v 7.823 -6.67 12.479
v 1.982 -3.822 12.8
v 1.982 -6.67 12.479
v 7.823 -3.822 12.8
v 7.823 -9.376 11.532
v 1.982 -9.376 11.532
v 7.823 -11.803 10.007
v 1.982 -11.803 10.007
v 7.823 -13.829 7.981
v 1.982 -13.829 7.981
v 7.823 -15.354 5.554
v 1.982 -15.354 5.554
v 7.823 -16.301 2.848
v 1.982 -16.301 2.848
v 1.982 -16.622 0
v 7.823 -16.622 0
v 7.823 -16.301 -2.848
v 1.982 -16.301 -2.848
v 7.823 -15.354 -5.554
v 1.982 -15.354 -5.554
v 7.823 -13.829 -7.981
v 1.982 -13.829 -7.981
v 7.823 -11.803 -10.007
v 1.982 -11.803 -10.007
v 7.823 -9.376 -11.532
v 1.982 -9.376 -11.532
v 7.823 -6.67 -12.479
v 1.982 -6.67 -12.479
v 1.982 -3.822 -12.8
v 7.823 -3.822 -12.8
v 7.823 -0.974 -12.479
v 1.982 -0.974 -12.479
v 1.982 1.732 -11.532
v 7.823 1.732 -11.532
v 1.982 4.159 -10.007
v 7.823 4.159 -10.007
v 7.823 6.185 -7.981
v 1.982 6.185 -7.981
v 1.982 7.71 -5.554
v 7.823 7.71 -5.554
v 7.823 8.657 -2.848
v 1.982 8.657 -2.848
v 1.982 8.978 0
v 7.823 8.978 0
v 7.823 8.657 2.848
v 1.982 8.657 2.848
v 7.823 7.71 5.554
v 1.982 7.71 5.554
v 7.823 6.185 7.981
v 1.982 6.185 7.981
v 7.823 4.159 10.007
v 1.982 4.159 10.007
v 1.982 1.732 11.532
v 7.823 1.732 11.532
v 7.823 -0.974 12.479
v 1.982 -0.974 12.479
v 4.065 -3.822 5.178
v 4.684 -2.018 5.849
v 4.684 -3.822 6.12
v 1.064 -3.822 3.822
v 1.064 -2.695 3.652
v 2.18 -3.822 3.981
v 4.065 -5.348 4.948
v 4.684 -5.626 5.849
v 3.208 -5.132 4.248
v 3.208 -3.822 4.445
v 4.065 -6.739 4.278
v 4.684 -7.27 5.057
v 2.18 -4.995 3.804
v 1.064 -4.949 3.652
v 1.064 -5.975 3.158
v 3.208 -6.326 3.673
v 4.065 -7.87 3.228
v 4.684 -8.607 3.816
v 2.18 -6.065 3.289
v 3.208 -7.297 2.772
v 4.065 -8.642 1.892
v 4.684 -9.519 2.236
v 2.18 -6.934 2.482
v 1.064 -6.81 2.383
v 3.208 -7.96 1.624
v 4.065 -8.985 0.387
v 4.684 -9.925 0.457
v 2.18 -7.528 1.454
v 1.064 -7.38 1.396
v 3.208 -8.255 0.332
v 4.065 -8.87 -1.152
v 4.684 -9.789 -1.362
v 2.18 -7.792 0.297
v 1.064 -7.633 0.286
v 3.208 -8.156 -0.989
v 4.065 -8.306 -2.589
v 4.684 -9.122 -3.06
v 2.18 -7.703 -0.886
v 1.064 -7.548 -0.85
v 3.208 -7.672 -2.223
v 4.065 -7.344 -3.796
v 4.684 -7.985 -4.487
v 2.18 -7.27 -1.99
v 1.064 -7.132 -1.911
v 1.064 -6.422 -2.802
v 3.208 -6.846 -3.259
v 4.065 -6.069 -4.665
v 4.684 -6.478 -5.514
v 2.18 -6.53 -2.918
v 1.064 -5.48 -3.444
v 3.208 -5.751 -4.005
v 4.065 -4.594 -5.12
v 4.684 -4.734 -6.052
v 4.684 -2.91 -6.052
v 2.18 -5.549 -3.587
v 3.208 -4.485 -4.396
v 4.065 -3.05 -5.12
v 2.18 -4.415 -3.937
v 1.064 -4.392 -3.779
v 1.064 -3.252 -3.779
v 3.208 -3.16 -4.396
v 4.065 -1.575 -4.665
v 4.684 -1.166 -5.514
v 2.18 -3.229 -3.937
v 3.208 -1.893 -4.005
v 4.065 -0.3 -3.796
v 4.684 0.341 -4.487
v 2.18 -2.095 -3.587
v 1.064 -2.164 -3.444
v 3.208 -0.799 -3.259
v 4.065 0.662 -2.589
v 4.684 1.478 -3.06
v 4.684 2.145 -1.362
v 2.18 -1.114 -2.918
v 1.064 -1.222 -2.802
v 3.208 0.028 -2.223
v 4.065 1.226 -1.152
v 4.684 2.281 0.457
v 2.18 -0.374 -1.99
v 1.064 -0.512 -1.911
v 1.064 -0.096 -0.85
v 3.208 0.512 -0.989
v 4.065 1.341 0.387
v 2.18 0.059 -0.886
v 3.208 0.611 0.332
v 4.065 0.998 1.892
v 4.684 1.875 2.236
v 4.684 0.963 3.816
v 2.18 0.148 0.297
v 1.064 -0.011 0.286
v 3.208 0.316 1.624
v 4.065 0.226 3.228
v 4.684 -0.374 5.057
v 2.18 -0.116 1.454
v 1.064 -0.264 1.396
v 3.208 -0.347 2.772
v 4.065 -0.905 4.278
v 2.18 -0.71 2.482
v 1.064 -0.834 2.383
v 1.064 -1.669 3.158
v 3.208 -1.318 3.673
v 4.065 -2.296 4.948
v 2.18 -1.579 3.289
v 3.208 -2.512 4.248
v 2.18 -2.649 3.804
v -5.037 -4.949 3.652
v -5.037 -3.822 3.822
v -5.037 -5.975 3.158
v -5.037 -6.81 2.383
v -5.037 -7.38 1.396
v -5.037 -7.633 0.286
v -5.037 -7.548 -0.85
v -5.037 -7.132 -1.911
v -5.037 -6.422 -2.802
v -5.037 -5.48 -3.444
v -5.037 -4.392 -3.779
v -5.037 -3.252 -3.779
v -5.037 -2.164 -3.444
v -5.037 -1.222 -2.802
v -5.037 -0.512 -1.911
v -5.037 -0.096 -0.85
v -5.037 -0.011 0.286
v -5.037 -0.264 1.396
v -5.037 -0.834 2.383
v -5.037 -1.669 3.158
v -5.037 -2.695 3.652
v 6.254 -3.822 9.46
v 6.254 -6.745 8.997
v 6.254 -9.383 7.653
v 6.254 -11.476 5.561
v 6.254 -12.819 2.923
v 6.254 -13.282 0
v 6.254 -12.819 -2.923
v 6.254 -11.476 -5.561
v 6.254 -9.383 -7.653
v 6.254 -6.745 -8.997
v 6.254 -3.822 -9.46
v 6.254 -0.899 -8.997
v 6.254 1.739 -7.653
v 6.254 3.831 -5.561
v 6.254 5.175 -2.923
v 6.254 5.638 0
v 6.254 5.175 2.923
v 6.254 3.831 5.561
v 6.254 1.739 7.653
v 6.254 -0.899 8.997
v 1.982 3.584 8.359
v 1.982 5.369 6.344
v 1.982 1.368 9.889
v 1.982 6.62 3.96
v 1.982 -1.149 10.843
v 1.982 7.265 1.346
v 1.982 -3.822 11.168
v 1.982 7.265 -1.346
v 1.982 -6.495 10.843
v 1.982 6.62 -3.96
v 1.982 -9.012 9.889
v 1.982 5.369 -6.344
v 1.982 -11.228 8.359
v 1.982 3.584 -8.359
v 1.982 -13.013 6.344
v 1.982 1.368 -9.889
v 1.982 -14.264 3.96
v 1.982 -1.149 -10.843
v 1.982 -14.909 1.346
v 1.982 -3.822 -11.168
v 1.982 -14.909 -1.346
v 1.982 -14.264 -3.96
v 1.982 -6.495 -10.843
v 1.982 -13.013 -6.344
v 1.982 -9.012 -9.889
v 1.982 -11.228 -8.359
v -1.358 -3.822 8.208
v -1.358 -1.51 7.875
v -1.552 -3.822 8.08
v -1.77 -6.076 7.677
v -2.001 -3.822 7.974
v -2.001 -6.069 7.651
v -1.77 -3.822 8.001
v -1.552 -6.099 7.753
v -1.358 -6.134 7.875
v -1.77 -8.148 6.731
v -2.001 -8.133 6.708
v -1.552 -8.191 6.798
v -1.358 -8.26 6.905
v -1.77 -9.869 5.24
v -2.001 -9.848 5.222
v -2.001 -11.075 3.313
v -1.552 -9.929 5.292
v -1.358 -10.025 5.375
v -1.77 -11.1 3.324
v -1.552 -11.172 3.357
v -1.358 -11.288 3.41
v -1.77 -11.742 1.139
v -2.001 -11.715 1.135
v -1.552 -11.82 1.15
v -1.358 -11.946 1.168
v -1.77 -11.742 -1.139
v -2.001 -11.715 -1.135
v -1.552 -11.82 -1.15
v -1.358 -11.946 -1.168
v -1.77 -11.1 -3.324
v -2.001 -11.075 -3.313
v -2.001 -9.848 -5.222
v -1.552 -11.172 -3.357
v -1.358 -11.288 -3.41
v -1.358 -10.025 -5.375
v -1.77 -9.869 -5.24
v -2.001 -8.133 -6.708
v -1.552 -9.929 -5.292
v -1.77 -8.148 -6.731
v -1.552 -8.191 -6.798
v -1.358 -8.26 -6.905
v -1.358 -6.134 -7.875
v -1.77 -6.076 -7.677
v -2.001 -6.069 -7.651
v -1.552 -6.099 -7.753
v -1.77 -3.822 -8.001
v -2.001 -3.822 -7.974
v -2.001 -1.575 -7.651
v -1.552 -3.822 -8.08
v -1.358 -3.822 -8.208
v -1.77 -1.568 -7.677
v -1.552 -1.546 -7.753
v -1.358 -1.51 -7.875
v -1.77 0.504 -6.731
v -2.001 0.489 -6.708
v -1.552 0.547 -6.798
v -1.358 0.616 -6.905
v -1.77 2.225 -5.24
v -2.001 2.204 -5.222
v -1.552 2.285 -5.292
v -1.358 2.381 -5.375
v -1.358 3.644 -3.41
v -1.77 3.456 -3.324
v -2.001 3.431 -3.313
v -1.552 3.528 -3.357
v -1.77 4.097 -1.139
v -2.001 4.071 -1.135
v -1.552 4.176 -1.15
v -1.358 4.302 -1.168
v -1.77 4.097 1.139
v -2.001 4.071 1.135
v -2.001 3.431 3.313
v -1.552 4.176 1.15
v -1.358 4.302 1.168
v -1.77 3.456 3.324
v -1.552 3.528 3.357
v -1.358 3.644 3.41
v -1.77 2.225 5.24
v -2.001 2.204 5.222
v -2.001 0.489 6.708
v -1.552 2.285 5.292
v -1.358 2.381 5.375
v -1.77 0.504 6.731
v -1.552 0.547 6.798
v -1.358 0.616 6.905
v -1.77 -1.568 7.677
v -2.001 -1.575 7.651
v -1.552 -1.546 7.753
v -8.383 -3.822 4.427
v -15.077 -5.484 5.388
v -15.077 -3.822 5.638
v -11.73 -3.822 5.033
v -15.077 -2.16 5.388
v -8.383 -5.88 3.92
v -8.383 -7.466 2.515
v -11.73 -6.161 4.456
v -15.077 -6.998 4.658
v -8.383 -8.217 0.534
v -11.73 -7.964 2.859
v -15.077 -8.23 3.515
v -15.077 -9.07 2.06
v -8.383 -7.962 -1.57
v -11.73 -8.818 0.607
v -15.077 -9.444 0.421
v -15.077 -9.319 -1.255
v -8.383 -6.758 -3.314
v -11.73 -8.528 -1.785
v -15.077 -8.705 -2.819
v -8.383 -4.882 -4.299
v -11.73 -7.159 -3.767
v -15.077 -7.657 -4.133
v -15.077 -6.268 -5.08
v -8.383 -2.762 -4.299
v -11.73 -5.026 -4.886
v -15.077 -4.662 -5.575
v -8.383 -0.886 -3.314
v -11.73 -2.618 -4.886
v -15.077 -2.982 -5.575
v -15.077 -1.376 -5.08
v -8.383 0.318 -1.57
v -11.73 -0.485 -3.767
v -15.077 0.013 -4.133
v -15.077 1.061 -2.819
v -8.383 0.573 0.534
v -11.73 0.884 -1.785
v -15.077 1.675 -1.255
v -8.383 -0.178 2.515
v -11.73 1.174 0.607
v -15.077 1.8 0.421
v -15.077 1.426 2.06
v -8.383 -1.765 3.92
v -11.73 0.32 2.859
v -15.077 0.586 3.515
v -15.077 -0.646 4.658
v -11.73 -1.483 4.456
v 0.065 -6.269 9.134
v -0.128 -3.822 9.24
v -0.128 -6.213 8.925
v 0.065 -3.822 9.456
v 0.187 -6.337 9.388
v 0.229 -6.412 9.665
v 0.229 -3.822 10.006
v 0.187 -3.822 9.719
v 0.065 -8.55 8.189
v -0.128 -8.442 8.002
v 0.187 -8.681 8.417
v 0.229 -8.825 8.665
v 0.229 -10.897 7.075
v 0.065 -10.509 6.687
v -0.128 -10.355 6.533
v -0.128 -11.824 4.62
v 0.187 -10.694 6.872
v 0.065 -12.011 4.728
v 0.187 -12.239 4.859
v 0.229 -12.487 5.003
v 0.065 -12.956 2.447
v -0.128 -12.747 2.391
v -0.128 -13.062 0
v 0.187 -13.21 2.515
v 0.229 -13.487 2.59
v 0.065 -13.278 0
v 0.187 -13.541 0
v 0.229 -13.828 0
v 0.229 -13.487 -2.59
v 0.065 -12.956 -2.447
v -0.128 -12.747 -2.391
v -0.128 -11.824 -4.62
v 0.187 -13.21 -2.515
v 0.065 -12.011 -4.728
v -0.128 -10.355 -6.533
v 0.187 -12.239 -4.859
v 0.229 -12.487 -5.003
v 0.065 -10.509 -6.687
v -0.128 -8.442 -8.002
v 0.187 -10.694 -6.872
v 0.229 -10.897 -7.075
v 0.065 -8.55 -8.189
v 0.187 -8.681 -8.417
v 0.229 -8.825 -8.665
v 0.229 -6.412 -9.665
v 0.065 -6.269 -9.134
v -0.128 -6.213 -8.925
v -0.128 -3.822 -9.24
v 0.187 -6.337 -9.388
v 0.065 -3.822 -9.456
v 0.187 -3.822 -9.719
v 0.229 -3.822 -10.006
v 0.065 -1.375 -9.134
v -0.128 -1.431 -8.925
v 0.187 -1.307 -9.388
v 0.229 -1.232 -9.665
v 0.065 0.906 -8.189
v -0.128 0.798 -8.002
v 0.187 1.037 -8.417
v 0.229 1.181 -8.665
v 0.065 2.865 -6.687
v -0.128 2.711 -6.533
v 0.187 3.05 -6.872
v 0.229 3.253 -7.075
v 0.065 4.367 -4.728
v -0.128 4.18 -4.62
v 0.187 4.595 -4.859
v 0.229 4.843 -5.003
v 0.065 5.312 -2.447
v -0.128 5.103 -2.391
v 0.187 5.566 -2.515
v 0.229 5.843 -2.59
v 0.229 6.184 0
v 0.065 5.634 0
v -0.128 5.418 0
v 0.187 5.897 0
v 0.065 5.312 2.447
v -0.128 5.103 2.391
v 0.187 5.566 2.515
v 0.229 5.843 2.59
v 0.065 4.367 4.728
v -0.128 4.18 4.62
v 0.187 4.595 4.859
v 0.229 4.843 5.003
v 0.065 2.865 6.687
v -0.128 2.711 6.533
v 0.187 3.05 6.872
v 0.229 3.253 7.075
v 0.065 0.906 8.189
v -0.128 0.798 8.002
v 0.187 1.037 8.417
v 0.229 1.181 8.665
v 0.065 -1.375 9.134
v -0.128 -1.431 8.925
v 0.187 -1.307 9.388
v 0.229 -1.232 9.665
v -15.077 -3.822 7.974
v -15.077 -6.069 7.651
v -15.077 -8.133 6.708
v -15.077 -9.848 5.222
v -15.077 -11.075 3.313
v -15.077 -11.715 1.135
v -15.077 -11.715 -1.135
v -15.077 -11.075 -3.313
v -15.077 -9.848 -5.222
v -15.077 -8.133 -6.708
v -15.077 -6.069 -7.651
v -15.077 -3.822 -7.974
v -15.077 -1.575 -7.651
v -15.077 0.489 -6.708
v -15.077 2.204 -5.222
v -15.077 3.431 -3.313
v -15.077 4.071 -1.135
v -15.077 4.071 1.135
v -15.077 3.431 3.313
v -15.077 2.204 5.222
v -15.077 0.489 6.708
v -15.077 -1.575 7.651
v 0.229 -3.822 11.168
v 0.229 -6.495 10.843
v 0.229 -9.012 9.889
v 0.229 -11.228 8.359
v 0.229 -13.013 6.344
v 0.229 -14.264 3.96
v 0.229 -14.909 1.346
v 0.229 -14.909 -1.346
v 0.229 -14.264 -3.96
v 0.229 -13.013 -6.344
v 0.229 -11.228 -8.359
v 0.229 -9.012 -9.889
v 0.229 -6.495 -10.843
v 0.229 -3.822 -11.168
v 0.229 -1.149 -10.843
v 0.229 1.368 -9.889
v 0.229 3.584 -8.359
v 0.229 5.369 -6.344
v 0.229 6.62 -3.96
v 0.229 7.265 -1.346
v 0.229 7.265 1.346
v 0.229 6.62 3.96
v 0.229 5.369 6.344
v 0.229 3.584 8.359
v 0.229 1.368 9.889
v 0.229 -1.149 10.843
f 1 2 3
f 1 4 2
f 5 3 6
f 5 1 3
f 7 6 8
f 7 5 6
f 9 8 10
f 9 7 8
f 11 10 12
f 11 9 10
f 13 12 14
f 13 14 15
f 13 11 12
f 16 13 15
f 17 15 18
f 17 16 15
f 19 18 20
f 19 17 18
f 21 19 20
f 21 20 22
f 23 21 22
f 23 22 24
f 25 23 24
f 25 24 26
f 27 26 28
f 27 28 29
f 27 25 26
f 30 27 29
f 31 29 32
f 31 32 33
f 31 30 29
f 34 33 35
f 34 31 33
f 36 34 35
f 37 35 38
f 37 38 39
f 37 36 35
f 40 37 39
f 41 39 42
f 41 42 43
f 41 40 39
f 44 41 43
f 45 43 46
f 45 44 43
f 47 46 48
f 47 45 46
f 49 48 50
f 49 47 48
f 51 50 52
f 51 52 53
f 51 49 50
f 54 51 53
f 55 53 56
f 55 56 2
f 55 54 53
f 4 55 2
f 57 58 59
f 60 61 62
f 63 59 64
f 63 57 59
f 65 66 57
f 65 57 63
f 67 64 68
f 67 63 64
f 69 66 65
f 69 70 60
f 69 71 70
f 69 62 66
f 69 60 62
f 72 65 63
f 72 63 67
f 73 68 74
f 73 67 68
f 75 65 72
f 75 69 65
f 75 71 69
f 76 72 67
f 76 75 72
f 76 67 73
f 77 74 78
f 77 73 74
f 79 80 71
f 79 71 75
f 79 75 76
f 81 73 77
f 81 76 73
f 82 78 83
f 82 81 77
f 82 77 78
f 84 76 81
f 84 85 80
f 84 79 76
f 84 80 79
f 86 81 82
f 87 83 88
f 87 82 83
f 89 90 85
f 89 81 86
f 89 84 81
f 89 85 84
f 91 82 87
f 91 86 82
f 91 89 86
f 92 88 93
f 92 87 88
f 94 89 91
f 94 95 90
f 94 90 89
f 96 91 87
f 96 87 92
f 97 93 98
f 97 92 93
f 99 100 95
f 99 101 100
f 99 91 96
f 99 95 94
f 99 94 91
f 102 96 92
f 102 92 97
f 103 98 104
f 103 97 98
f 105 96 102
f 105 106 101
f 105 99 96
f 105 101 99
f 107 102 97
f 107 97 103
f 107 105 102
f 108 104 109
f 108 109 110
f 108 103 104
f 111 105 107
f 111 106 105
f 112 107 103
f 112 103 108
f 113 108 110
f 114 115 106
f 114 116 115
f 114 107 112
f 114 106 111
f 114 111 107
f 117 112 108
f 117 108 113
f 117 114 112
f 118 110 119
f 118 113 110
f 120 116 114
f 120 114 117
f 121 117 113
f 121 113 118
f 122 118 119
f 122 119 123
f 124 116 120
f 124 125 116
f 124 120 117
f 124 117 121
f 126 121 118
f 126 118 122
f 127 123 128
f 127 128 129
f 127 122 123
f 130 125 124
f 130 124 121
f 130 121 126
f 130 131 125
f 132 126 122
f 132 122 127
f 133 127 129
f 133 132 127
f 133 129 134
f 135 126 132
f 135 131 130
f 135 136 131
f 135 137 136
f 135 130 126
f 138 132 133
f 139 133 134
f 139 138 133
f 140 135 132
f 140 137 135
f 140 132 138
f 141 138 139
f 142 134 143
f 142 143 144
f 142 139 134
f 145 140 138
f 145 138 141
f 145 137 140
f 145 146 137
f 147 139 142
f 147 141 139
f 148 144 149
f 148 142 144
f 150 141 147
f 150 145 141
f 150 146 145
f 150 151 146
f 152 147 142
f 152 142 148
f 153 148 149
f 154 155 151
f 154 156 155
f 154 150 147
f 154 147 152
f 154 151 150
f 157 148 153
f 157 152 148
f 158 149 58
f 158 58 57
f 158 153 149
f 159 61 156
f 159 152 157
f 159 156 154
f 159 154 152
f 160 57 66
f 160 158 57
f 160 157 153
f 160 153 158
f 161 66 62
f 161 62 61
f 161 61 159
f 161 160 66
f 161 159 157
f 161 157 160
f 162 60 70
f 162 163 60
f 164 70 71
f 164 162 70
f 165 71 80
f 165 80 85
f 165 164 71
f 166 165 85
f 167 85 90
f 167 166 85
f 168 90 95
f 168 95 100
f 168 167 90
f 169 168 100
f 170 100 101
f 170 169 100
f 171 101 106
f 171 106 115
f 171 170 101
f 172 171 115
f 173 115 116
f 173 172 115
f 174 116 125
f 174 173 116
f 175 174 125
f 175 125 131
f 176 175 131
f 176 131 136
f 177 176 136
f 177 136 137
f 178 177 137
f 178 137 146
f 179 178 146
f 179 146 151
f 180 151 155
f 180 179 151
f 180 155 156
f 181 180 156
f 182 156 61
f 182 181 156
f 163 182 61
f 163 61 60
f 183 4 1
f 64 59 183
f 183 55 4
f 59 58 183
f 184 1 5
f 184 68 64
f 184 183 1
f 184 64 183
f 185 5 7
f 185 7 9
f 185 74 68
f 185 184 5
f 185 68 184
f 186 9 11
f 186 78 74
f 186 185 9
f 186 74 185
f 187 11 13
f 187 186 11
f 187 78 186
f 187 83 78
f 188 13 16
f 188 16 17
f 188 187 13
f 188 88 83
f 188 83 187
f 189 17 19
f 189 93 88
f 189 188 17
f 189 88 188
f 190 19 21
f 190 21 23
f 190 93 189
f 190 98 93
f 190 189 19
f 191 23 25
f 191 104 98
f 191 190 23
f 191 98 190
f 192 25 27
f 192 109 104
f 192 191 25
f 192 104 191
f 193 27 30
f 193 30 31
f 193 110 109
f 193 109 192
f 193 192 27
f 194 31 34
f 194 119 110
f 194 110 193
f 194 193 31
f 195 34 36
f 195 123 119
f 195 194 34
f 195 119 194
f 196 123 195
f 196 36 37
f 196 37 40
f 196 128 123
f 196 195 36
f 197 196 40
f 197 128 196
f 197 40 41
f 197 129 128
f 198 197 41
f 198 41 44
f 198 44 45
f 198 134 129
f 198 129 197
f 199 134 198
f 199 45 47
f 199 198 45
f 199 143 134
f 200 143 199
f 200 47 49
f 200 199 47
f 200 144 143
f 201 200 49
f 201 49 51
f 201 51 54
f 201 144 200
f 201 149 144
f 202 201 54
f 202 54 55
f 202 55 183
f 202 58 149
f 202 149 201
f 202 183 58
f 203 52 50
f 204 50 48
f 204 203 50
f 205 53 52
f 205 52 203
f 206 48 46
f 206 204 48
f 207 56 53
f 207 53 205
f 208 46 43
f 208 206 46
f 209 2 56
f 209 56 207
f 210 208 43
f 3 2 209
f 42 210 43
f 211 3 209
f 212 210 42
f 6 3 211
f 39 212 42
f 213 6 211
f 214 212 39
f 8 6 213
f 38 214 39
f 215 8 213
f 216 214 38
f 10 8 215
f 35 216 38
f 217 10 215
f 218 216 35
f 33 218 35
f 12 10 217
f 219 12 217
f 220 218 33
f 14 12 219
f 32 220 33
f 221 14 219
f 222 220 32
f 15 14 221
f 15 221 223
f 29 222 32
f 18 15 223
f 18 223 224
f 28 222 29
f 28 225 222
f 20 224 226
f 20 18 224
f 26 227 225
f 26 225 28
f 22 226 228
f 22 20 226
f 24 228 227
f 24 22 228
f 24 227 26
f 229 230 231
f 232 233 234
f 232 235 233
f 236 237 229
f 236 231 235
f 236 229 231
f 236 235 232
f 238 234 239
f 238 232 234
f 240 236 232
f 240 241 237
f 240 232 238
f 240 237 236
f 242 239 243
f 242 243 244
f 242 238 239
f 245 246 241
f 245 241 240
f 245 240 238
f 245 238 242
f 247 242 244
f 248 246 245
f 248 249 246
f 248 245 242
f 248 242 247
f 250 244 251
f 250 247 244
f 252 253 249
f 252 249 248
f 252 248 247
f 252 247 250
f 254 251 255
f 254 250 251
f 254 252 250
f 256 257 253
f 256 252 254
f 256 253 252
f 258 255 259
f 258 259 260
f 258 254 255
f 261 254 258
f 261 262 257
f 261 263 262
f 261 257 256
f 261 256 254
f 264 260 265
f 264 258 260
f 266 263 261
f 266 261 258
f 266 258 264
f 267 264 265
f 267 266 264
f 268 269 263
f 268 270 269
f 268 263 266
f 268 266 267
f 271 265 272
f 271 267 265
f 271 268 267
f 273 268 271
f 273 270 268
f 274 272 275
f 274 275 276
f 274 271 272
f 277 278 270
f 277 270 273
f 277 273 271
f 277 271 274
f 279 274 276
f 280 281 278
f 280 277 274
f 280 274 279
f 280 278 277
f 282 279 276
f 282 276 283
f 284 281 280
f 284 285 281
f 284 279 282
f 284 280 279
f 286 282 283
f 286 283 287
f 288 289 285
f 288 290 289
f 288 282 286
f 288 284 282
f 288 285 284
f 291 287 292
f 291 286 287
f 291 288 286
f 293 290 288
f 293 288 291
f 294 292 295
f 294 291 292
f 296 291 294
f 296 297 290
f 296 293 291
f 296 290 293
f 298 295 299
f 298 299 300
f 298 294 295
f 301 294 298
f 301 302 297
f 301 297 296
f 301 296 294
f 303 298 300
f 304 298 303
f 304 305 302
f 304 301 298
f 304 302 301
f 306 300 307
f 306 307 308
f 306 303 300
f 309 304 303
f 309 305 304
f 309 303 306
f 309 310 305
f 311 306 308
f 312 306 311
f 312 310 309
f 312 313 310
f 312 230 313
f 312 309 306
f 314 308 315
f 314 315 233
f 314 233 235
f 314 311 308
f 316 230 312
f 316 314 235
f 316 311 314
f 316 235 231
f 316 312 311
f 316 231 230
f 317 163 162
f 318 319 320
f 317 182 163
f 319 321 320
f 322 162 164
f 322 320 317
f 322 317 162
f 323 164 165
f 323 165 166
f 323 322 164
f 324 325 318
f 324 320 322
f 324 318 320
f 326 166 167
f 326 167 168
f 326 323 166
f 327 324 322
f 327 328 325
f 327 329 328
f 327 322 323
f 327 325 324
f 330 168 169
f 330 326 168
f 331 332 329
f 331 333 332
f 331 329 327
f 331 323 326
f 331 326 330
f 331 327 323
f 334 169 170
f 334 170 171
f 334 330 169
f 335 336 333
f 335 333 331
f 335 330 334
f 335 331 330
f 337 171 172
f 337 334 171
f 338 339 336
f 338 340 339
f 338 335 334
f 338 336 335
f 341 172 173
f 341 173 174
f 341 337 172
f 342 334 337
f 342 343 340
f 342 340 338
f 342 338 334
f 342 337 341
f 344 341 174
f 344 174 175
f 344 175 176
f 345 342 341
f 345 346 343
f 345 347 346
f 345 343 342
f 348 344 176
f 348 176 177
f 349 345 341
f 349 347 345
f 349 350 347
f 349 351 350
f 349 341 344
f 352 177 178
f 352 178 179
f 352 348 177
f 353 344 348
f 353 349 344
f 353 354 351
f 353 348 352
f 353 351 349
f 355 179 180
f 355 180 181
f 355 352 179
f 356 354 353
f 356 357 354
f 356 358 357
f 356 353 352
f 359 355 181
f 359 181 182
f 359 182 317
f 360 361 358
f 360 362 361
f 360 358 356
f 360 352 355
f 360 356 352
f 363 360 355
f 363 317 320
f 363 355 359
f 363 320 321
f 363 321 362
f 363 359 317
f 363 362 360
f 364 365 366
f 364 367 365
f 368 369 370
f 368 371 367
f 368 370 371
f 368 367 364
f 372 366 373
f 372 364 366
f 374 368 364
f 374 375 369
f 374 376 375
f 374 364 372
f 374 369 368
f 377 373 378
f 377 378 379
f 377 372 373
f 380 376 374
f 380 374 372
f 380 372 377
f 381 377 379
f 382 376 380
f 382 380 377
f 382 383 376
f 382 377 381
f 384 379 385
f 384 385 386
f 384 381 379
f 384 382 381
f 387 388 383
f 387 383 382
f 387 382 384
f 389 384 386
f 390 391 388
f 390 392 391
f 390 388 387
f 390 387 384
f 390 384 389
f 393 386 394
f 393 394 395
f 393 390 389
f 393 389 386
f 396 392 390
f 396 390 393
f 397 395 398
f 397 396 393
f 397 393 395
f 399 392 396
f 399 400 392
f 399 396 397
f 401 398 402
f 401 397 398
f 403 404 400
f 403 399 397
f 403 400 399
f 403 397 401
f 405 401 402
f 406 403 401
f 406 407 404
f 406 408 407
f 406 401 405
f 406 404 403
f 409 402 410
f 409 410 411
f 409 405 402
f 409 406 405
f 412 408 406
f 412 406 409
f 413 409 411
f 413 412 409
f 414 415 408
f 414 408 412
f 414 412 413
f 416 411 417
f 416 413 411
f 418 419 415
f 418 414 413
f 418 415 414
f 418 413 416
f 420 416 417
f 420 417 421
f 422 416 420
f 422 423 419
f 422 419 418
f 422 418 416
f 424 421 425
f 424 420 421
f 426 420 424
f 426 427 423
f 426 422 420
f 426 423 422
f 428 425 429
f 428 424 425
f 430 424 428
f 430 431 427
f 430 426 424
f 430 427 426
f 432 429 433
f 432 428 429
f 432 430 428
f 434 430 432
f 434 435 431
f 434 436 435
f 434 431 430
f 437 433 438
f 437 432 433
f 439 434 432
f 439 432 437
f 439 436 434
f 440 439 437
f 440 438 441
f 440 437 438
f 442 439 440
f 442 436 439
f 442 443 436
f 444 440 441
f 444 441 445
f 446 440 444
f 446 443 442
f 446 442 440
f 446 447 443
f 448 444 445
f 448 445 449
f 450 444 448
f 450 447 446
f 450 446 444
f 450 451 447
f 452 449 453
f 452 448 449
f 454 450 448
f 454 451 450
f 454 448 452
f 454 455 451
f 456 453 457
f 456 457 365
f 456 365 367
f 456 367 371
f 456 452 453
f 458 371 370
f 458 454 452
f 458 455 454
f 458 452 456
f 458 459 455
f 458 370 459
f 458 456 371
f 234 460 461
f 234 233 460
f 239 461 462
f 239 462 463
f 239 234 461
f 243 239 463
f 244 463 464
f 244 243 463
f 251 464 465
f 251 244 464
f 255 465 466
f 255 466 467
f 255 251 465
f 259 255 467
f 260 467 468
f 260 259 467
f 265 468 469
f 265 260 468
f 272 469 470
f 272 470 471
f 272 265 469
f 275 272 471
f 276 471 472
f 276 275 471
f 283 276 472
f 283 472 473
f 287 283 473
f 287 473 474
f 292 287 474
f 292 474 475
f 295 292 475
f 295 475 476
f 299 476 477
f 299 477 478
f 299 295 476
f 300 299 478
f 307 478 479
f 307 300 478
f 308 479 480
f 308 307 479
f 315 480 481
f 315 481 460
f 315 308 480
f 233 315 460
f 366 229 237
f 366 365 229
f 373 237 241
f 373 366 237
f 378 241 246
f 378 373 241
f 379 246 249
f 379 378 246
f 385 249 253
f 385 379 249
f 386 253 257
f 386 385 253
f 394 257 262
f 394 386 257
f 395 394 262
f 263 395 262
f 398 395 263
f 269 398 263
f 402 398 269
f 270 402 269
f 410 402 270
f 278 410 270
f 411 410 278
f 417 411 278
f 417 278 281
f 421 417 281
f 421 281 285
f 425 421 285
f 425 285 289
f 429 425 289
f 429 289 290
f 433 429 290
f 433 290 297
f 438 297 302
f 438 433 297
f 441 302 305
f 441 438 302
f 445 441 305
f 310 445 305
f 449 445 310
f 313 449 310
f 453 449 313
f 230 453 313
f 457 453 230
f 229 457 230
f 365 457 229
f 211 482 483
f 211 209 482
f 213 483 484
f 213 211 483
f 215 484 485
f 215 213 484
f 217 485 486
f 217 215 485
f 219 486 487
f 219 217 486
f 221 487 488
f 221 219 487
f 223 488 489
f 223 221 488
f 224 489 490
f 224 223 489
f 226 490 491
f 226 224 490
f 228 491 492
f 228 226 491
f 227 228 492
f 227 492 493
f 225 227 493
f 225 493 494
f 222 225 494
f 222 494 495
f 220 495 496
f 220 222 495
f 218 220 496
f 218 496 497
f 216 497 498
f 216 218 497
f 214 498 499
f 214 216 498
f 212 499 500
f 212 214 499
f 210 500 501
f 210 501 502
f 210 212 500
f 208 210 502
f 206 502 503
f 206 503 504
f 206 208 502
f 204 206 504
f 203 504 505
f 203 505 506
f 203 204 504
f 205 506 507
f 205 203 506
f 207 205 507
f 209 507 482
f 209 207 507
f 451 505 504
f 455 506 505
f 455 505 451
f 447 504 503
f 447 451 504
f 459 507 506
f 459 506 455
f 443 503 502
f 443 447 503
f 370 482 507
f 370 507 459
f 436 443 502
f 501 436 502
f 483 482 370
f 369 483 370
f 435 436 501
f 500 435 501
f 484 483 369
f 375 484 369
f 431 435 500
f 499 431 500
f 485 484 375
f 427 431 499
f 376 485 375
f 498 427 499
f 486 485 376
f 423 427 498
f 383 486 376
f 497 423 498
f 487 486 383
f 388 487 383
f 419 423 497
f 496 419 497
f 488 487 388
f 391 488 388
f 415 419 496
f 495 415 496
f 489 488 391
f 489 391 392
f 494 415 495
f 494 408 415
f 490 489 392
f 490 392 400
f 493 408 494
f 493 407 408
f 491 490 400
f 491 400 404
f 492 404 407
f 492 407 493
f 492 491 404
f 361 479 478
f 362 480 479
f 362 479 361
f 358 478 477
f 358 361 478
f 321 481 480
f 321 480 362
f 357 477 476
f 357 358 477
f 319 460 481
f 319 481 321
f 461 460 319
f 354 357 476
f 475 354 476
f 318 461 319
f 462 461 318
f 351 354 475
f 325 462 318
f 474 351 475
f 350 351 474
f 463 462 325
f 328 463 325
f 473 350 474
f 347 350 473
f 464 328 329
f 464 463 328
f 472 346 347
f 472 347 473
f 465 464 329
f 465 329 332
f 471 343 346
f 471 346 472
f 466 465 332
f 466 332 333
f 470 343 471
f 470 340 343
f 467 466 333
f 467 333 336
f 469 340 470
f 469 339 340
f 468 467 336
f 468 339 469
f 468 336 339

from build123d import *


with BuildPart() as part:
    # Esquisse1 → Révolution1 (revolve)
    with BuildSketch(Plane.XY, mode=Mode.PRIVATE) as r_volution1_sk:
        with BuildLine():
            Line((1.981656821, 8.97797736), (7.823456821, 8.97797736))
            Line((7.823456821, 8.97797736), (4.683813218, 2.298439639))
            ThreePointArc((4.683813218, 2.298439639), (3.207806254, 0.623149289), (1.06377284, 0))
            Line((1.06377284, 0), (0.803456821, 0))
            Line((0.803456821, 0), (-5.036543179, 0))
            Line((-5.036543179, 0), (-15.076543179, 1.81597736))
            Line((-15.076543179, 1.81597736), (-15.076543179, 4.15197736))
            Line((-15.076543179, 4.15197736), (-2.000513414, 4.15197736))
            ThreePointArc((-2.000513414, 4.15197736), (-1.65849327, 4.212284739), (-1.357725804, 4.385932917))
            Line((-1.357725804, 4.385932917), (-0.12815557, 5.417664847))
            ThreePointArc((-0.12815557, 5.417664847), (0.135364608, 5.761091028), (0.229056821, 6.18370929))
            Line((0.229056821, 6.18370929), (0.229056821, 7.34597736))
            Line((0.229056821, 7.34597736), (1.981656821, 7.34597736))
            Line((1.981656821, 7.34597736), (1.981656821, 8.97797736))
        make_face()
    revolve(r_volution1_sk.sketch.rotate(Axis((-19.476947674, -3.82202264, 0), (1, 0, 0)), 90), axis=Axis((-19.476947674, -3.82202264, 0), (1, 0, 0)))


solid = part.part
